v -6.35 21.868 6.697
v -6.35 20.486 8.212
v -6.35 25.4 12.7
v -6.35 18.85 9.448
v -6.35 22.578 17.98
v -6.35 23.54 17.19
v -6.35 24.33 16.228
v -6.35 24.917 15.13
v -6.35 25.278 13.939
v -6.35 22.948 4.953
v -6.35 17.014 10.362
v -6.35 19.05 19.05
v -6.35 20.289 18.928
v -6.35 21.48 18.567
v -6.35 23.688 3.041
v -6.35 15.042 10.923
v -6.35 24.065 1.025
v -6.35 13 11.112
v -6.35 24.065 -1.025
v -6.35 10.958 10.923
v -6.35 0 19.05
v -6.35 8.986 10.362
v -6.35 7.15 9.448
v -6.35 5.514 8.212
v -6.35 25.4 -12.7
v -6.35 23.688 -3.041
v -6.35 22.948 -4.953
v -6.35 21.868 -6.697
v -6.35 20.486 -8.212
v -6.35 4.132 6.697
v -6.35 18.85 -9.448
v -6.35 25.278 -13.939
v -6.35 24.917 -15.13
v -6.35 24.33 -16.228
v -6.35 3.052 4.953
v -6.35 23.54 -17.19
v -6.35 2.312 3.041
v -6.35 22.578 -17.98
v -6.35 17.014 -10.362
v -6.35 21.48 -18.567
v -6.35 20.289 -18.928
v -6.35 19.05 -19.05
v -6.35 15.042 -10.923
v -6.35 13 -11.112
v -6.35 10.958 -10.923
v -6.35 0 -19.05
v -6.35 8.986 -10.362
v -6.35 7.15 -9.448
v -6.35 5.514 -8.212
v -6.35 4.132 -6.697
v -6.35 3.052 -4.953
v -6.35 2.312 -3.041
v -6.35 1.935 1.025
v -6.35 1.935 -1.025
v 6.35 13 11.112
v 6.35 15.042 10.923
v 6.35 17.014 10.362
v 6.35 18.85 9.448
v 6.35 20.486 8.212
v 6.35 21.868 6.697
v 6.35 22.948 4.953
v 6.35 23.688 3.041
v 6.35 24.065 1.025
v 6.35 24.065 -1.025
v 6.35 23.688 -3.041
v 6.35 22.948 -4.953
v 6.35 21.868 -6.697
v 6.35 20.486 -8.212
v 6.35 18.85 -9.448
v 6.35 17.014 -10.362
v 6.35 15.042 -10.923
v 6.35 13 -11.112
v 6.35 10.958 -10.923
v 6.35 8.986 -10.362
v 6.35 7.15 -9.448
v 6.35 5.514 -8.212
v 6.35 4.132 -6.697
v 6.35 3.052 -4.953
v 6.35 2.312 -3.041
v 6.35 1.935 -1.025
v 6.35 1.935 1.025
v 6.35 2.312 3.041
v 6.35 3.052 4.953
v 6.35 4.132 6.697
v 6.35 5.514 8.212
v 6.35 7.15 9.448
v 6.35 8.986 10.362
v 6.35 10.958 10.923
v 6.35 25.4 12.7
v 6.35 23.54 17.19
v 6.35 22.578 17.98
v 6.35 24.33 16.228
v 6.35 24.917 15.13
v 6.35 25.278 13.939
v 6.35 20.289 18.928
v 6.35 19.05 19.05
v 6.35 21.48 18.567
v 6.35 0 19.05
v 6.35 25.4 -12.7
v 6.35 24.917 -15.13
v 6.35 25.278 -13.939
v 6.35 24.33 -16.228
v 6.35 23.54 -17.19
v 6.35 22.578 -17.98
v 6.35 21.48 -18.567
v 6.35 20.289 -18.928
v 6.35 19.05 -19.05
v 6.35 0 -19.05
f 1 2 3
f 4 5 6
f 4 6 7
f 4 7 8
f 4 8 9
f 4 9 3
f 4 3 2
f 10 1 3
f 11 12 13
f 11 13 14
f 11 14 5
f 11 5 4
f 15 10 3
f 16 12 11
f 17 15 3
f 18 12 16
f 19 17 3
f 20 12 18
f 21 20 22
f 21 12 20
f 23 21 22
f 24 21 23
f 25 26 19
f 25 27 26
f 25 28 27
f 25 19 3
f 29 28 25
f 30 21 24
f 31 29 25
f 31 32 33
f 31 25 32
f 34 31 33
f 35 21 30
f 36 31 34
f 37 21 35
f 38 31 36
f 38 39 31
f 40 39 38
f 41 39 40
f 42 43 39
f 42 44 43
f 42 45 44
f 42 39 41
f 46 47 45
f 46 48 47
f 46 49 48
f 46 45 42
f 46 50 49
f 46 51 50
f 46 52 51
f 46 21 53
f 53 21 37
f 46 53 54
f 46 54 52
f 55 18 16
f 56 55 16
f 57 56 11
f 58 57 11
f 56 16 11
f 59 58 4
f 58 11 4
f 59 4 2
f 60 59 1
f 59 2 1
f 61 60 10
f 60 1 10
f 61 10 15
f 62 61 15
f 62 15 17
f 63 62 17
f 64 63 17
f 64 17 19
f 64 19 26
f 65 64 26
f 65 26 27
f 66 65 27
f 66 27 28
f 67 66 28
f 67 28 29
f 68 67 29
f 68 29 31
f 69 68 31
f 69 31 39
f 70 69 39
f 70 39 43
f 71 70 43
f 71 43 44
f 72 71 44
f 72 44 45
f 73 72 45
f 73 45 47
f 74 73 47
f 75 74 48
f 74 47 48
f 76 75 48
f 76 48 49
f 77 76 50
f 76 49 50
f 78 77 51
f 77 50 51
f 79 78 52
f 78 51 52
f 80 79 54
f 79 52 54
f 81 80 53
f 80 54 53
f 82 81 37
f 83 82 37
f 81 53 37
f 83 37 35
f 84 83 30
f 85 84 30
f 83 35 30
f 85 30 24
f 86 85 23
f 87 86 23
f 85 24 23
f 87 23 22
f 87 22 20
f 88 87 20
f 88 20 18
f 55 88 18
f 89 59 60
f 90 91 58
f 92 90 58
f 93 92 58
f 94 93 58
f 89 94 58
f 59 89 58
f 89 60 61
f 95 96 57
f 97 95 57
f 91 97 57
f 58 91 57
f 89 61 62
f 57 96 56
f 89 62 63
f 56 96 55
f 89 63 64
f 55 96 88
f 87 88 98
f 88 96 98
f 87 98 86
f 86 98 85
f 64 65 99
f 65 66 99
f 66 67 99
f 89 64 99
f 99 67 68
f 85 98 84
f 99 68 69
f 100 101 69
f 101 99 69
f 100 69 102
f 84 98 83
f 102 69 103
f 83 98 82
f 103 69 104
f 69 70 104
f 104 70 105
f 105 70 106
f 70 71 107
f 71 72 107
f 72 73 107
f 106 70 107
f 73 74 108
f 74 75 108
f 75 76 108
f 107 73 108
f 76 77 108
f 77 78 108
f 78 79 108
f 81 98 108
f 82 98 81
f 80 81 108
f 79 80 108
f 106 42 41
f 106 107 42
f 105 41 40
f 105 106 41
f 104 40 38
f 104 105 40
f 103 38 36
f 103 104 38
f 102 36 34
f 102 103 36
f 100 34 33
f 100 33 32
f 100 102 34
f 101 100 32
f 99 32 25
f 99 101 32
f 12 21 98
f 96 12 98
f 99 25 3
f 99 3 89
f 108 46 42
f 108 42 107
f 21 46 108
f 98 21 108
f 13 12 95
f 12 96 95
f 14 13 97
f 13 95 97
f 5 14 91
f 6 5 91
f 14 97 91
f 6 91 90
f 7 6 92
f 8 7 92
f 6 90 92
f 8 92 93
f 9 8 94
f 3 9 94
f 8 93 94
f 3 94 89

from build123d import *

# Parameters (mm, degrees)
SKETCH1_W           = 12.7
SKETCH1_H           = 38.1
BOSS_EXTRUDE1_DEPTH = 25.4
FILLET1_R           = 6.35
SKETCH2_R           = 11.1125
CUT_EXTRUDE1_DEPTH  = 13.7


with BuildPart() as part:
    # Sketch1 → Boss-Extrude1 (new body)
    with BuildSketch(Plane(origin=(0, 0, 0), x_dir=(1, 0, 0), z_dir=(0, 1, 0))):
        Rectangle(SKETCH1_W, SKETCH1_H)
    extrude(amount=BOSS_EXTRUDE1_DEPTH)

    # Fillet1
    fillet1_edges = [part.edges().sort_by_distance(p)[0] for p in [
        (0, 25.4, 19.05),
        (0, 25.4, -19.05),
    ]]
    fillet(fillet1_edges, radius=FILLET1_R)

    # Sketch2 → Cut-Extrude1 (cut, through all)
    with BuildSketch(Plane.ZY.offset(6.35)):
        with Locations((0, 13)):
            Circle(SKETCH2_R)
    extrude(amount=-CUT_EXTRUDE1_DEPTH, mode=Mode.SUBTRACT)


solid = part.part
